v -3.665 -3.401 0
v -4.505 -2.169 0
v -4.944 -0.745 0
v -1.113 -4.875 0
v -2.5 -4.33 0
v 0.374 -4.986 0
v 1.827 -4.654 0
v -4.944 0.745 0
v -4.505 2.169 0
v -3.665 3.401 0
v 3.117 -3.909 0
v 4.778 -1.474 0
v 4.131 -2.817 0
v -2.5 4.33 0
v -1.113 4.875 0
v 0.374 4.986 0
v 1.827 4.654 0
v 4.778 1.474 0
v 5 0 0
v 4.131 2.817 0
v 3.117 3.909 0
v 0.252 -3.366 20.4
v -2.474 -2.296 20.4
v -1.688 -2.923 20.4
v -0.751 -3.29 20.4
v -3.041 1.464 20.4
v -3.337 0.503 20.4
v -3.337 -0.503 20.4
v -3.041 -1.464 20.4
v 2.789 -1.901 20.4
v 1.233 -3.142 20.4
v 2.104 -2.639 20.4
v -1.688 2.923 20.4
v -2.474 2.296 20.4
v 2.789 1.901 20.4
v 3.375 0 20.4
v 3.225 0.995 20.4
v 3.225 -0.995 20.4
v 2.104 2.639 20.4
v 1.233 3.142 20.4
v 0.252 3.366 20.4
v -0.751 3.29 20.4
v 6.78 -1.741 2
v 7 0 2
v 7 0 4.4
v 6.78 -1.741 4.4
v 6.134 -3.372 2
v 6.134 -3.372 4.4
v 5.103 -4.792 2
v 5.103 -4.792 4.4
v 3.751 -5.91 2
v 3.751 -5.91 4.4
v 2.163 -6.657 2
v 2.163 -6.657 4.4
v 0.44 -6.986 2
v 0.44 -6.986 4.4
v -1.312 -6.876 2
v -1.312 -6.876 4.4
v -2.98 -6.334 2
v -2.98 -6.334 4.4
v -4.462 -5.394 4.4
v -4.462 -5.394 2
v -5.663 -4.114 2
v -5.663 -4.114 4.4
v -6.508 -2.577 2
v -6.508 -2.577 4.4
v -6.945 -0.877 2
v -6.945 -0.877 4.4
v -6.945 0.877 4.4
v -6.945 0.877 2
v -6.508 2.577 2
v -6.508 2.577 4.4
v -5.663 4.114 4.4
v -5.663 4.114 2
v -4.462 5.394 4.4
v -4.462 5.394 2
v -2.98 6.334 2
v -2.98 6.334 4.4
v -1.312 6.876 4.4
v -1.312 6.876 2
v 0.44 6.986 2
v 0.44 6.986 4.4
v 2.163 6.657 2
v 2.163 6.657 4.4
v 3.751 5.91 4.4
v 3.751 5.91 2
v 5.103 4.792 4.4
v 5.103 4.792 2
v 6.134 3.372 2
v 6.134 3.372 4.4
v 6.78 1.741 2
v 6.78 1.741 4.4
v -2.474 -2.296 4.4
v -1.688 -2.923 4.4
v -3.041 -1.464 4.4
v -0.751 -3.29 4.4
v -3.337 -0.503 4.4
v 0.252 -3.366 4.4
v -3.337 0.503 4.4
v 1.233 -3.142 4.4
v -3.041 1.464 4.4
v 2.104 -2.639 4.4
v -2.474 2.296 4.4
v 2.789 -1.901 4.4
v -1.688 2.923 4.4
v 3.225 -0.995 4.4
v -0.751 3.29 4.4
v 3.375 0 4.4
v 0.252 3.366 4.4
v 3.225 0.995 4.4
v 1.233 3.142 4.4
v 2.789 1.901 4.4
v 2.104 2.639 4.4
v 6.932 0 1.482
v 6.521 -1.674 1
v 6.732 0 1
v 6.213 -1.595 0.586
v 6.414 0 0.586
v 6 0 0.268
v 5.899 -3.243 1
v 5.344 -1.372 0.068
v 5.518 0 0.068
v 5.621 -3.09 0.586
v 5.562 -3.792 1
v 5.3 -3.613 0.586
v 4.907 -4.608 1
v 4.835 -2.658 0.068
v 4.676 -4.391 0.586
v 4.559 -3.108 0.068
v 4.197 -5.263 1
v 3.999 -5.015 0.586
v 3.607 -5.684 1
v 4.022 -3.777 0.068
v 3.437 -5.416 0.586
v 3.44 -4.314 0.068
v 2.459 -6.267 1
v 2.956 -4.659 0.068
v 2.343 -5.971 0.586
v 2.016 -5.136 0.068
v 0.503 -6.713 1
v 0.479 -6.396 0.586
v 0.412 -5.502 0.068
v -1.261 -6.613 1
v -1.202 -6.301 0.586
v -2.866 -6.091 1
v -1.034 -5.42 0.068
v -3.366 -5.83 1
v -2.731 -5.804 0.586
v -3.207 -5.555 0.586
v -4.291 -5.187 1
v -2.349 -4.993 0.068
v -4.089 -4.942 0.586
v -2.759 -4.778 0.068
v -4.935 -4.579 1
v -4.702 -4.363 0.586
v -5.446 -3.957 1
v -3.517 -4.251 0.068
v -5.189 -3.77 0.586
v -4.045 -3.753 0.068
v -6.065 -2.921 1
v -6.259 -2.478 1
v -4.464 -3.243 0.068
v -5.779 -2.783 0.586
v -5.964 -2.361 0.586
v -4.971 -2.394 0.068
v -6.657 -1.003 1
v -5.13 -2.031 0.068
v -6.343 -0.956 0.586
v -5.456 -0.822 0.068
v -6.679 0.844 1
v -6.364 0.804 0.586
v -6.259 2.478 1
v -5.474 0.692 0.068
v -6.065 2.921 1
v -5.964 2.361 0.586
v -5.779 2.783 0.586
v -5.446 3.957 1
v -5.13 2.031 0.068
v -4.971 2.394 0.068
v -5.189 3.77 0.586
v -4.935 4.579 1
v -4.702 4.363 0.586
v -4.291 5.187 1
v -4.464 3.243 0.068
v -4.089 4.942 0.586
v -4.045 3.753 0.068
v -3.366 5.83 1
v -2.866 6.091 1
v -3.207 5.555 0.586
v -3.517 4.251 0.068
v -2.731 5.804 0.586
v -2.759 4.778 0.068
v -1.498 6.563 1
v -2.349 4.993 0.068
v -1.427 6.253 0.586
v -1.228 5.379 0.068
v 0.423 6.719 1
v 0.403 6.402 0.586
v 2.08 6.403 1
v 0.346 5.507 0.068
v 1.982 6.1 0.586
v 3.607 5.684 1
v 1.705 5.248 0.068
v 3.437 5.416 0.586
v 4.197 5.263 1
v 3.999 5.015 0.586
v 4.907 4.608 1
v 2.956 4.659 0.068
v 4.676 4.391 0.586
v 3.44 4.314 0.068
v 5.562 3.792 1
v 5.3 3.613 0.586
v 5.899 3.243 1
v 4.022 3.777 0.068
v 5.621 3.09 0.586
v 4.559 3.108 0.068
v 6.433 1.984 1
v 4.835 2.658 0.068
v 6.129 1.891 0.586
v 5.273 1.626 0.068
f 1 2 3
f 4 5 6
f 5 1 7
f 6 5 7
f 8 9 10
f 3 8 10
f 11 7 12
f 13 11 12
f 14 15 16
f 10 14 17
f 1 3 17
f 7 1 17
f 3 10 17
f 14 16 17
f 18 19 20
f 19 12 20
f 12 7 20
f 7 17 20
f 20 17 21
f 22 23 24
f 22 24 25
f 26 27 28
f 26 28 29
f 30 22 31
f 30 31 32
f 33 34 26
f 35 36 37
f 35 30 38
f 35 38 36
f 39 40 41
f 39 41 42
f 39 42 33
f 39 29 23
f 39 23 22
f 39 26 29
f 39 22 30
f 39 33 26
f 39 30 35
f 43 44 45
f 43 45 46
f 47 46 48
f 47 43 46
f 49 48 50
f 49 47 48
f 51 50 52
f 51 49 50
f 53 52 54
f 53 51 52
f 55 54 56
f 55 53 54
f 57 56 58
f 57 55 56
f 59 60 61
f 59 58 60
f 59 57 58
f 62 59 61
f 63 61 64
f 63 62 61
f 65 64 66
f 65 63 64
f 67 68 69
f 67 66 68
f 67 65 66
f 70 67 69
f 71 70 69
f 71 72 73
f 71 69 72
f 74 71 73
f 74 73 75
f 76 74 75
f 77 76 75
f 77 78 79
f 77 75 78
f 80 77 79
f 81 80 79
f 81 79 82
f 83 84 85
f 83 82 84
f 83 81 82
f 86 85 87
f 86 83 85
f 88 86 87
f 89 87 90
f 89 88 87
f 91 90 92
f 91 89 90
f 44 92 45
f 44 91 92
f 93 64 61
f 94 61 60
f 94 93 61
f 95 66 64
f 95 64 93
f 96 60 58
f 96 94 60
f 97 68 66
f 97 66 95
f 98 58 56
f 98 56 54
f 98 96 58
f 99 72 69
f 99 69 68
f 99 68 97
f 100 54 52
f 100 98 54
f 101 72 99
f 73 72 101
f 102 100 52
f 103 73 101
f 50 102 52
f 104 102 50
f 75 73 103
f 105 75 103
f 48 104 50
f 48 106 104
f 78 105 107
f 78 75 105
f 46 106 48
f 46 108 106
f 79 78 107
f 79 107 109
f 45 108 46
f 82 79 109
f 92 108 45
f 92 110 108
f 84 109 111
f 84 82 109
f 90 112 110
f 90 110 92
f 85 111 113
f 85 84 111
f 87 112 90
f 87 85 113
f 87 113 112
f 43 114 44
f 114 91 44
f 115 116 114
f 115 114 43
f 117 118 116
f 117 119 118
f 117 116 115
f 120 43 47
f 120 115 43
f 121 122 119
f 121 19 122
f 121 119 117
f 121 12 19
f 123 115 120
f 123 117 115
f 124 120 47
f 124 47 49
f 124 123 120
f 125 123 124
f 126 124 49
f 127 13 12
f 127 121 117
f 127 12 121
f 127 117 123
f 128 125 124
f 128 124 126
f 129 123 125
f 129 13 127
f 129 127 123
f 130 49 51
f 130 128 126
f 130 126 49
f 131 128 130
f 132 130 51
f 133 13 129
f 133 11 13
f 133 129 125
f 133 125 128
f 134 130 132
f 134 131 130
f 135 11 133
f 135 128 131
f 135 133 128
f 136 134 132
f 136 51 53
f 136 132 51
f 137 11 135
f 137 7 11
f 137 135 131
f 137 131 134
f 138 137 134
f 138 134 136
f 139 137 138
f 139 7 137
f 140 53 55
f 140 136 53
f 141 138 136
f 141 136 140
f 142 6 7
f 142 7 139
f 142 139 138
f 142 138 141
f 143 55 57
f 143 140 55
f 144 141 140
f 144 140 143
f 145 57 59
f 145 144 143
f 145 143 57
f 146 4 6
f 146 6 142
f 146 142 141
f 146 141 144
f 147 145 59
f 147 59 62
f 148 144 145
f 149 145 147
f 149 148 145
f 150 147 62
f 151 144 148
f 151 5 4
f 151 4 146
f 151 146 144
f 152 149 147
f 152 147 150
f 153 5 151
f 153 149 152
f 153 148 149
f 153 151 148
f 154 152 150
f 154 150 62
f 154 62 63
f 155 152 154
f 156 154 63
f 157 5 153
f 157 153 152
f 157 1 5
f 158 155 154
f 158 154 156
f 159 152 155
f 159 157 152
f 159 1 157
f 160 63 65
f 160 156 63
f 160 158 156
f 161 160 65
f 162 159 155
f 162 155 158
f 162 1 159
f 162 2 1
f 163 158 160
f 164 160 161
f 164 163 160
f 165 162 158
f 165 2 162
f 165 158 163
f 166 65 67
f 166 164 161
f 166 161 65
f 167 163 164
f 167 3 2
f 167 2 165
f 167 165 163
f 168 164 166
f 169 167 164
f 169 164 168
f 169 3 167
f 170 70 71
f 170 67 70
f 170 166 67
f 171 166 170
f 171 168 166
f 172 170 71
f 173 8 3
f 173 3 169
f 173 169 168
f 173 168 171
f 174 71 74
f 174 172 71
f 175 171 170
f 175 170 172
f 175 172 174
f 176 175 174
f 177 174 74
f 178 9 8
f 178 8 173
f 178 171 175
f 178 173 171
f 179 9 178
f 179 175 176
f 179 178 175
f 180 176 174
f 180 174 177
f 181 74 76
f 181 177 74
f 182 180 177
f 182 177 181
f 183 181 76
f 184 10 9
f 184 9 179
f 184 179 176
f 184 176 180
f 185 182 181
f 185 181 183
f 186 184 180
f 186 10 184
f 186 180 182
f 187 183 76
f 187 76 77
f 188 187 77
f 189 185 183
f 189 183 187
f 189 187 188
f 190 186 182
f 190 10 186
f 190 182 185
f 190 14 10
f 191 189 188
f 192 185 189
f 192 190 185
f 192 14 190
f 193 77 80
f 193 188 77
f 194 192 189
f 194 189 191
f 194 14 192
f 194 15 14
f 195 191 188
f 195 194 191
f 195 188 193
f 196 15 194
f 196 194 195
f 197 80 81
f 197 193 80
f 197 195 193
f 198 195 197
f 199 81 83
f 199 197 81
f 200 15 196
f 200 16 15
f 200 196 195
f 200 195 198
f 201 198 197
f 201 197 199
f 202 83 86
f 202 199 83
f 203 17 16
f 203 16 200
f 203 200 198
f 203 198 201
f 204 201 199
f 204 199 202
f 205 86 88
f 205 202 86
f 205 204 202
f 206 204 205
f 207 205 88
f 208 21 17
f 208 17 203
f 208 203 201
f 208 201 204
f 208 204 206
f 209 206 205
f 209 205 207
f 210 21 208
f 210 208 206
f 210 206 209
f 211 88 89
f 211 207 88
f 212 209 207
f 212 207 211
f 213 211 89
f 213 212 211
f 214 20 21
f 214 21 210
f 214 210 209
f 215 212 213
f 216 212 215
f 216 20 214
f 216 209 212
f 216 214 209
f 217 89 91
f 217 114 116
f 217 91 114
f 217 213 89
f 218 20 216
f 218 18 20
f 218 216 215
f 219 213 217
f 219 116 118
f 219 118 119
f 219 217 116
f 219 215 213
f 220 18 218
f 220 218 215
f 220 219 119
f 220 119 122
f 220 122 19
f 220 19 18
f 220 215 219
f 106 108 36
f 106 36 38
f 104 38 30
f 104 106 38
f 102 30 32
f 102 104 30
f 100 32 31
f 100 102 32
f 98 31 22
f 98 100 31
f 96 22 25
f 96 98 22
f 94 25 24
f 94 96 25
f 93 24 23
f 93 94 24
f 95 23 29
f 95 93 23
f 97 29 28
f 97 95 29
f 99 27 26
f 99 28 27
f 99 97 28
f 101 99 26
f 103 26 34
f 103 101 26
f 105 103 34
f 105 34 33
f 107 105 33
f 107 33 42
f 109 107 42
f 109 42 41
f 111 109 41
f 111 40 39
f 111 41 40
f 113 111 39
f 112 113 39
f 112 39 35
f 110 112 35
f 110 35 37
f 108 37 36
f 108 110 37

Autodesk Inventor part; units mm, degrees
ref_plane "YZ Plane" through (0, 0, 0) normal (1, 0, 0) x (0, 1, 0)
ref_plane "XZ Plane" through (0, 0, 0) normal (0, 1, 0) x (-1, 0, 0)
ref_plane "XY Plane" through (0, 0, 0) normal (0, 0, 1) x (1, 0, 0)
sketch "Boceto1" plane through (0, 0, 0) normal (0, 0, 1) x (1, 0, 0)
  circle A0 centre (0, 0) radius 7
  dimension "d0" = 14
extrude "Extrusión1" add sketch "Boceto1" along normal blind 4.4
fillet "Empalme1" radius 2 1 edges at (-7, 0, 0)
sketch "Boceto2" plane through (0, 0, 4.4) normal (0, 0, 1) x (1, 0, 0)
  circle A0 centre (0, 0) radius 3.375
  dimension "d5" = 6.75
extrude "Extrusión2" add sketch "Boceto2" along normal blind 16
properties part number "Socket" material "Aluminio 6061"
